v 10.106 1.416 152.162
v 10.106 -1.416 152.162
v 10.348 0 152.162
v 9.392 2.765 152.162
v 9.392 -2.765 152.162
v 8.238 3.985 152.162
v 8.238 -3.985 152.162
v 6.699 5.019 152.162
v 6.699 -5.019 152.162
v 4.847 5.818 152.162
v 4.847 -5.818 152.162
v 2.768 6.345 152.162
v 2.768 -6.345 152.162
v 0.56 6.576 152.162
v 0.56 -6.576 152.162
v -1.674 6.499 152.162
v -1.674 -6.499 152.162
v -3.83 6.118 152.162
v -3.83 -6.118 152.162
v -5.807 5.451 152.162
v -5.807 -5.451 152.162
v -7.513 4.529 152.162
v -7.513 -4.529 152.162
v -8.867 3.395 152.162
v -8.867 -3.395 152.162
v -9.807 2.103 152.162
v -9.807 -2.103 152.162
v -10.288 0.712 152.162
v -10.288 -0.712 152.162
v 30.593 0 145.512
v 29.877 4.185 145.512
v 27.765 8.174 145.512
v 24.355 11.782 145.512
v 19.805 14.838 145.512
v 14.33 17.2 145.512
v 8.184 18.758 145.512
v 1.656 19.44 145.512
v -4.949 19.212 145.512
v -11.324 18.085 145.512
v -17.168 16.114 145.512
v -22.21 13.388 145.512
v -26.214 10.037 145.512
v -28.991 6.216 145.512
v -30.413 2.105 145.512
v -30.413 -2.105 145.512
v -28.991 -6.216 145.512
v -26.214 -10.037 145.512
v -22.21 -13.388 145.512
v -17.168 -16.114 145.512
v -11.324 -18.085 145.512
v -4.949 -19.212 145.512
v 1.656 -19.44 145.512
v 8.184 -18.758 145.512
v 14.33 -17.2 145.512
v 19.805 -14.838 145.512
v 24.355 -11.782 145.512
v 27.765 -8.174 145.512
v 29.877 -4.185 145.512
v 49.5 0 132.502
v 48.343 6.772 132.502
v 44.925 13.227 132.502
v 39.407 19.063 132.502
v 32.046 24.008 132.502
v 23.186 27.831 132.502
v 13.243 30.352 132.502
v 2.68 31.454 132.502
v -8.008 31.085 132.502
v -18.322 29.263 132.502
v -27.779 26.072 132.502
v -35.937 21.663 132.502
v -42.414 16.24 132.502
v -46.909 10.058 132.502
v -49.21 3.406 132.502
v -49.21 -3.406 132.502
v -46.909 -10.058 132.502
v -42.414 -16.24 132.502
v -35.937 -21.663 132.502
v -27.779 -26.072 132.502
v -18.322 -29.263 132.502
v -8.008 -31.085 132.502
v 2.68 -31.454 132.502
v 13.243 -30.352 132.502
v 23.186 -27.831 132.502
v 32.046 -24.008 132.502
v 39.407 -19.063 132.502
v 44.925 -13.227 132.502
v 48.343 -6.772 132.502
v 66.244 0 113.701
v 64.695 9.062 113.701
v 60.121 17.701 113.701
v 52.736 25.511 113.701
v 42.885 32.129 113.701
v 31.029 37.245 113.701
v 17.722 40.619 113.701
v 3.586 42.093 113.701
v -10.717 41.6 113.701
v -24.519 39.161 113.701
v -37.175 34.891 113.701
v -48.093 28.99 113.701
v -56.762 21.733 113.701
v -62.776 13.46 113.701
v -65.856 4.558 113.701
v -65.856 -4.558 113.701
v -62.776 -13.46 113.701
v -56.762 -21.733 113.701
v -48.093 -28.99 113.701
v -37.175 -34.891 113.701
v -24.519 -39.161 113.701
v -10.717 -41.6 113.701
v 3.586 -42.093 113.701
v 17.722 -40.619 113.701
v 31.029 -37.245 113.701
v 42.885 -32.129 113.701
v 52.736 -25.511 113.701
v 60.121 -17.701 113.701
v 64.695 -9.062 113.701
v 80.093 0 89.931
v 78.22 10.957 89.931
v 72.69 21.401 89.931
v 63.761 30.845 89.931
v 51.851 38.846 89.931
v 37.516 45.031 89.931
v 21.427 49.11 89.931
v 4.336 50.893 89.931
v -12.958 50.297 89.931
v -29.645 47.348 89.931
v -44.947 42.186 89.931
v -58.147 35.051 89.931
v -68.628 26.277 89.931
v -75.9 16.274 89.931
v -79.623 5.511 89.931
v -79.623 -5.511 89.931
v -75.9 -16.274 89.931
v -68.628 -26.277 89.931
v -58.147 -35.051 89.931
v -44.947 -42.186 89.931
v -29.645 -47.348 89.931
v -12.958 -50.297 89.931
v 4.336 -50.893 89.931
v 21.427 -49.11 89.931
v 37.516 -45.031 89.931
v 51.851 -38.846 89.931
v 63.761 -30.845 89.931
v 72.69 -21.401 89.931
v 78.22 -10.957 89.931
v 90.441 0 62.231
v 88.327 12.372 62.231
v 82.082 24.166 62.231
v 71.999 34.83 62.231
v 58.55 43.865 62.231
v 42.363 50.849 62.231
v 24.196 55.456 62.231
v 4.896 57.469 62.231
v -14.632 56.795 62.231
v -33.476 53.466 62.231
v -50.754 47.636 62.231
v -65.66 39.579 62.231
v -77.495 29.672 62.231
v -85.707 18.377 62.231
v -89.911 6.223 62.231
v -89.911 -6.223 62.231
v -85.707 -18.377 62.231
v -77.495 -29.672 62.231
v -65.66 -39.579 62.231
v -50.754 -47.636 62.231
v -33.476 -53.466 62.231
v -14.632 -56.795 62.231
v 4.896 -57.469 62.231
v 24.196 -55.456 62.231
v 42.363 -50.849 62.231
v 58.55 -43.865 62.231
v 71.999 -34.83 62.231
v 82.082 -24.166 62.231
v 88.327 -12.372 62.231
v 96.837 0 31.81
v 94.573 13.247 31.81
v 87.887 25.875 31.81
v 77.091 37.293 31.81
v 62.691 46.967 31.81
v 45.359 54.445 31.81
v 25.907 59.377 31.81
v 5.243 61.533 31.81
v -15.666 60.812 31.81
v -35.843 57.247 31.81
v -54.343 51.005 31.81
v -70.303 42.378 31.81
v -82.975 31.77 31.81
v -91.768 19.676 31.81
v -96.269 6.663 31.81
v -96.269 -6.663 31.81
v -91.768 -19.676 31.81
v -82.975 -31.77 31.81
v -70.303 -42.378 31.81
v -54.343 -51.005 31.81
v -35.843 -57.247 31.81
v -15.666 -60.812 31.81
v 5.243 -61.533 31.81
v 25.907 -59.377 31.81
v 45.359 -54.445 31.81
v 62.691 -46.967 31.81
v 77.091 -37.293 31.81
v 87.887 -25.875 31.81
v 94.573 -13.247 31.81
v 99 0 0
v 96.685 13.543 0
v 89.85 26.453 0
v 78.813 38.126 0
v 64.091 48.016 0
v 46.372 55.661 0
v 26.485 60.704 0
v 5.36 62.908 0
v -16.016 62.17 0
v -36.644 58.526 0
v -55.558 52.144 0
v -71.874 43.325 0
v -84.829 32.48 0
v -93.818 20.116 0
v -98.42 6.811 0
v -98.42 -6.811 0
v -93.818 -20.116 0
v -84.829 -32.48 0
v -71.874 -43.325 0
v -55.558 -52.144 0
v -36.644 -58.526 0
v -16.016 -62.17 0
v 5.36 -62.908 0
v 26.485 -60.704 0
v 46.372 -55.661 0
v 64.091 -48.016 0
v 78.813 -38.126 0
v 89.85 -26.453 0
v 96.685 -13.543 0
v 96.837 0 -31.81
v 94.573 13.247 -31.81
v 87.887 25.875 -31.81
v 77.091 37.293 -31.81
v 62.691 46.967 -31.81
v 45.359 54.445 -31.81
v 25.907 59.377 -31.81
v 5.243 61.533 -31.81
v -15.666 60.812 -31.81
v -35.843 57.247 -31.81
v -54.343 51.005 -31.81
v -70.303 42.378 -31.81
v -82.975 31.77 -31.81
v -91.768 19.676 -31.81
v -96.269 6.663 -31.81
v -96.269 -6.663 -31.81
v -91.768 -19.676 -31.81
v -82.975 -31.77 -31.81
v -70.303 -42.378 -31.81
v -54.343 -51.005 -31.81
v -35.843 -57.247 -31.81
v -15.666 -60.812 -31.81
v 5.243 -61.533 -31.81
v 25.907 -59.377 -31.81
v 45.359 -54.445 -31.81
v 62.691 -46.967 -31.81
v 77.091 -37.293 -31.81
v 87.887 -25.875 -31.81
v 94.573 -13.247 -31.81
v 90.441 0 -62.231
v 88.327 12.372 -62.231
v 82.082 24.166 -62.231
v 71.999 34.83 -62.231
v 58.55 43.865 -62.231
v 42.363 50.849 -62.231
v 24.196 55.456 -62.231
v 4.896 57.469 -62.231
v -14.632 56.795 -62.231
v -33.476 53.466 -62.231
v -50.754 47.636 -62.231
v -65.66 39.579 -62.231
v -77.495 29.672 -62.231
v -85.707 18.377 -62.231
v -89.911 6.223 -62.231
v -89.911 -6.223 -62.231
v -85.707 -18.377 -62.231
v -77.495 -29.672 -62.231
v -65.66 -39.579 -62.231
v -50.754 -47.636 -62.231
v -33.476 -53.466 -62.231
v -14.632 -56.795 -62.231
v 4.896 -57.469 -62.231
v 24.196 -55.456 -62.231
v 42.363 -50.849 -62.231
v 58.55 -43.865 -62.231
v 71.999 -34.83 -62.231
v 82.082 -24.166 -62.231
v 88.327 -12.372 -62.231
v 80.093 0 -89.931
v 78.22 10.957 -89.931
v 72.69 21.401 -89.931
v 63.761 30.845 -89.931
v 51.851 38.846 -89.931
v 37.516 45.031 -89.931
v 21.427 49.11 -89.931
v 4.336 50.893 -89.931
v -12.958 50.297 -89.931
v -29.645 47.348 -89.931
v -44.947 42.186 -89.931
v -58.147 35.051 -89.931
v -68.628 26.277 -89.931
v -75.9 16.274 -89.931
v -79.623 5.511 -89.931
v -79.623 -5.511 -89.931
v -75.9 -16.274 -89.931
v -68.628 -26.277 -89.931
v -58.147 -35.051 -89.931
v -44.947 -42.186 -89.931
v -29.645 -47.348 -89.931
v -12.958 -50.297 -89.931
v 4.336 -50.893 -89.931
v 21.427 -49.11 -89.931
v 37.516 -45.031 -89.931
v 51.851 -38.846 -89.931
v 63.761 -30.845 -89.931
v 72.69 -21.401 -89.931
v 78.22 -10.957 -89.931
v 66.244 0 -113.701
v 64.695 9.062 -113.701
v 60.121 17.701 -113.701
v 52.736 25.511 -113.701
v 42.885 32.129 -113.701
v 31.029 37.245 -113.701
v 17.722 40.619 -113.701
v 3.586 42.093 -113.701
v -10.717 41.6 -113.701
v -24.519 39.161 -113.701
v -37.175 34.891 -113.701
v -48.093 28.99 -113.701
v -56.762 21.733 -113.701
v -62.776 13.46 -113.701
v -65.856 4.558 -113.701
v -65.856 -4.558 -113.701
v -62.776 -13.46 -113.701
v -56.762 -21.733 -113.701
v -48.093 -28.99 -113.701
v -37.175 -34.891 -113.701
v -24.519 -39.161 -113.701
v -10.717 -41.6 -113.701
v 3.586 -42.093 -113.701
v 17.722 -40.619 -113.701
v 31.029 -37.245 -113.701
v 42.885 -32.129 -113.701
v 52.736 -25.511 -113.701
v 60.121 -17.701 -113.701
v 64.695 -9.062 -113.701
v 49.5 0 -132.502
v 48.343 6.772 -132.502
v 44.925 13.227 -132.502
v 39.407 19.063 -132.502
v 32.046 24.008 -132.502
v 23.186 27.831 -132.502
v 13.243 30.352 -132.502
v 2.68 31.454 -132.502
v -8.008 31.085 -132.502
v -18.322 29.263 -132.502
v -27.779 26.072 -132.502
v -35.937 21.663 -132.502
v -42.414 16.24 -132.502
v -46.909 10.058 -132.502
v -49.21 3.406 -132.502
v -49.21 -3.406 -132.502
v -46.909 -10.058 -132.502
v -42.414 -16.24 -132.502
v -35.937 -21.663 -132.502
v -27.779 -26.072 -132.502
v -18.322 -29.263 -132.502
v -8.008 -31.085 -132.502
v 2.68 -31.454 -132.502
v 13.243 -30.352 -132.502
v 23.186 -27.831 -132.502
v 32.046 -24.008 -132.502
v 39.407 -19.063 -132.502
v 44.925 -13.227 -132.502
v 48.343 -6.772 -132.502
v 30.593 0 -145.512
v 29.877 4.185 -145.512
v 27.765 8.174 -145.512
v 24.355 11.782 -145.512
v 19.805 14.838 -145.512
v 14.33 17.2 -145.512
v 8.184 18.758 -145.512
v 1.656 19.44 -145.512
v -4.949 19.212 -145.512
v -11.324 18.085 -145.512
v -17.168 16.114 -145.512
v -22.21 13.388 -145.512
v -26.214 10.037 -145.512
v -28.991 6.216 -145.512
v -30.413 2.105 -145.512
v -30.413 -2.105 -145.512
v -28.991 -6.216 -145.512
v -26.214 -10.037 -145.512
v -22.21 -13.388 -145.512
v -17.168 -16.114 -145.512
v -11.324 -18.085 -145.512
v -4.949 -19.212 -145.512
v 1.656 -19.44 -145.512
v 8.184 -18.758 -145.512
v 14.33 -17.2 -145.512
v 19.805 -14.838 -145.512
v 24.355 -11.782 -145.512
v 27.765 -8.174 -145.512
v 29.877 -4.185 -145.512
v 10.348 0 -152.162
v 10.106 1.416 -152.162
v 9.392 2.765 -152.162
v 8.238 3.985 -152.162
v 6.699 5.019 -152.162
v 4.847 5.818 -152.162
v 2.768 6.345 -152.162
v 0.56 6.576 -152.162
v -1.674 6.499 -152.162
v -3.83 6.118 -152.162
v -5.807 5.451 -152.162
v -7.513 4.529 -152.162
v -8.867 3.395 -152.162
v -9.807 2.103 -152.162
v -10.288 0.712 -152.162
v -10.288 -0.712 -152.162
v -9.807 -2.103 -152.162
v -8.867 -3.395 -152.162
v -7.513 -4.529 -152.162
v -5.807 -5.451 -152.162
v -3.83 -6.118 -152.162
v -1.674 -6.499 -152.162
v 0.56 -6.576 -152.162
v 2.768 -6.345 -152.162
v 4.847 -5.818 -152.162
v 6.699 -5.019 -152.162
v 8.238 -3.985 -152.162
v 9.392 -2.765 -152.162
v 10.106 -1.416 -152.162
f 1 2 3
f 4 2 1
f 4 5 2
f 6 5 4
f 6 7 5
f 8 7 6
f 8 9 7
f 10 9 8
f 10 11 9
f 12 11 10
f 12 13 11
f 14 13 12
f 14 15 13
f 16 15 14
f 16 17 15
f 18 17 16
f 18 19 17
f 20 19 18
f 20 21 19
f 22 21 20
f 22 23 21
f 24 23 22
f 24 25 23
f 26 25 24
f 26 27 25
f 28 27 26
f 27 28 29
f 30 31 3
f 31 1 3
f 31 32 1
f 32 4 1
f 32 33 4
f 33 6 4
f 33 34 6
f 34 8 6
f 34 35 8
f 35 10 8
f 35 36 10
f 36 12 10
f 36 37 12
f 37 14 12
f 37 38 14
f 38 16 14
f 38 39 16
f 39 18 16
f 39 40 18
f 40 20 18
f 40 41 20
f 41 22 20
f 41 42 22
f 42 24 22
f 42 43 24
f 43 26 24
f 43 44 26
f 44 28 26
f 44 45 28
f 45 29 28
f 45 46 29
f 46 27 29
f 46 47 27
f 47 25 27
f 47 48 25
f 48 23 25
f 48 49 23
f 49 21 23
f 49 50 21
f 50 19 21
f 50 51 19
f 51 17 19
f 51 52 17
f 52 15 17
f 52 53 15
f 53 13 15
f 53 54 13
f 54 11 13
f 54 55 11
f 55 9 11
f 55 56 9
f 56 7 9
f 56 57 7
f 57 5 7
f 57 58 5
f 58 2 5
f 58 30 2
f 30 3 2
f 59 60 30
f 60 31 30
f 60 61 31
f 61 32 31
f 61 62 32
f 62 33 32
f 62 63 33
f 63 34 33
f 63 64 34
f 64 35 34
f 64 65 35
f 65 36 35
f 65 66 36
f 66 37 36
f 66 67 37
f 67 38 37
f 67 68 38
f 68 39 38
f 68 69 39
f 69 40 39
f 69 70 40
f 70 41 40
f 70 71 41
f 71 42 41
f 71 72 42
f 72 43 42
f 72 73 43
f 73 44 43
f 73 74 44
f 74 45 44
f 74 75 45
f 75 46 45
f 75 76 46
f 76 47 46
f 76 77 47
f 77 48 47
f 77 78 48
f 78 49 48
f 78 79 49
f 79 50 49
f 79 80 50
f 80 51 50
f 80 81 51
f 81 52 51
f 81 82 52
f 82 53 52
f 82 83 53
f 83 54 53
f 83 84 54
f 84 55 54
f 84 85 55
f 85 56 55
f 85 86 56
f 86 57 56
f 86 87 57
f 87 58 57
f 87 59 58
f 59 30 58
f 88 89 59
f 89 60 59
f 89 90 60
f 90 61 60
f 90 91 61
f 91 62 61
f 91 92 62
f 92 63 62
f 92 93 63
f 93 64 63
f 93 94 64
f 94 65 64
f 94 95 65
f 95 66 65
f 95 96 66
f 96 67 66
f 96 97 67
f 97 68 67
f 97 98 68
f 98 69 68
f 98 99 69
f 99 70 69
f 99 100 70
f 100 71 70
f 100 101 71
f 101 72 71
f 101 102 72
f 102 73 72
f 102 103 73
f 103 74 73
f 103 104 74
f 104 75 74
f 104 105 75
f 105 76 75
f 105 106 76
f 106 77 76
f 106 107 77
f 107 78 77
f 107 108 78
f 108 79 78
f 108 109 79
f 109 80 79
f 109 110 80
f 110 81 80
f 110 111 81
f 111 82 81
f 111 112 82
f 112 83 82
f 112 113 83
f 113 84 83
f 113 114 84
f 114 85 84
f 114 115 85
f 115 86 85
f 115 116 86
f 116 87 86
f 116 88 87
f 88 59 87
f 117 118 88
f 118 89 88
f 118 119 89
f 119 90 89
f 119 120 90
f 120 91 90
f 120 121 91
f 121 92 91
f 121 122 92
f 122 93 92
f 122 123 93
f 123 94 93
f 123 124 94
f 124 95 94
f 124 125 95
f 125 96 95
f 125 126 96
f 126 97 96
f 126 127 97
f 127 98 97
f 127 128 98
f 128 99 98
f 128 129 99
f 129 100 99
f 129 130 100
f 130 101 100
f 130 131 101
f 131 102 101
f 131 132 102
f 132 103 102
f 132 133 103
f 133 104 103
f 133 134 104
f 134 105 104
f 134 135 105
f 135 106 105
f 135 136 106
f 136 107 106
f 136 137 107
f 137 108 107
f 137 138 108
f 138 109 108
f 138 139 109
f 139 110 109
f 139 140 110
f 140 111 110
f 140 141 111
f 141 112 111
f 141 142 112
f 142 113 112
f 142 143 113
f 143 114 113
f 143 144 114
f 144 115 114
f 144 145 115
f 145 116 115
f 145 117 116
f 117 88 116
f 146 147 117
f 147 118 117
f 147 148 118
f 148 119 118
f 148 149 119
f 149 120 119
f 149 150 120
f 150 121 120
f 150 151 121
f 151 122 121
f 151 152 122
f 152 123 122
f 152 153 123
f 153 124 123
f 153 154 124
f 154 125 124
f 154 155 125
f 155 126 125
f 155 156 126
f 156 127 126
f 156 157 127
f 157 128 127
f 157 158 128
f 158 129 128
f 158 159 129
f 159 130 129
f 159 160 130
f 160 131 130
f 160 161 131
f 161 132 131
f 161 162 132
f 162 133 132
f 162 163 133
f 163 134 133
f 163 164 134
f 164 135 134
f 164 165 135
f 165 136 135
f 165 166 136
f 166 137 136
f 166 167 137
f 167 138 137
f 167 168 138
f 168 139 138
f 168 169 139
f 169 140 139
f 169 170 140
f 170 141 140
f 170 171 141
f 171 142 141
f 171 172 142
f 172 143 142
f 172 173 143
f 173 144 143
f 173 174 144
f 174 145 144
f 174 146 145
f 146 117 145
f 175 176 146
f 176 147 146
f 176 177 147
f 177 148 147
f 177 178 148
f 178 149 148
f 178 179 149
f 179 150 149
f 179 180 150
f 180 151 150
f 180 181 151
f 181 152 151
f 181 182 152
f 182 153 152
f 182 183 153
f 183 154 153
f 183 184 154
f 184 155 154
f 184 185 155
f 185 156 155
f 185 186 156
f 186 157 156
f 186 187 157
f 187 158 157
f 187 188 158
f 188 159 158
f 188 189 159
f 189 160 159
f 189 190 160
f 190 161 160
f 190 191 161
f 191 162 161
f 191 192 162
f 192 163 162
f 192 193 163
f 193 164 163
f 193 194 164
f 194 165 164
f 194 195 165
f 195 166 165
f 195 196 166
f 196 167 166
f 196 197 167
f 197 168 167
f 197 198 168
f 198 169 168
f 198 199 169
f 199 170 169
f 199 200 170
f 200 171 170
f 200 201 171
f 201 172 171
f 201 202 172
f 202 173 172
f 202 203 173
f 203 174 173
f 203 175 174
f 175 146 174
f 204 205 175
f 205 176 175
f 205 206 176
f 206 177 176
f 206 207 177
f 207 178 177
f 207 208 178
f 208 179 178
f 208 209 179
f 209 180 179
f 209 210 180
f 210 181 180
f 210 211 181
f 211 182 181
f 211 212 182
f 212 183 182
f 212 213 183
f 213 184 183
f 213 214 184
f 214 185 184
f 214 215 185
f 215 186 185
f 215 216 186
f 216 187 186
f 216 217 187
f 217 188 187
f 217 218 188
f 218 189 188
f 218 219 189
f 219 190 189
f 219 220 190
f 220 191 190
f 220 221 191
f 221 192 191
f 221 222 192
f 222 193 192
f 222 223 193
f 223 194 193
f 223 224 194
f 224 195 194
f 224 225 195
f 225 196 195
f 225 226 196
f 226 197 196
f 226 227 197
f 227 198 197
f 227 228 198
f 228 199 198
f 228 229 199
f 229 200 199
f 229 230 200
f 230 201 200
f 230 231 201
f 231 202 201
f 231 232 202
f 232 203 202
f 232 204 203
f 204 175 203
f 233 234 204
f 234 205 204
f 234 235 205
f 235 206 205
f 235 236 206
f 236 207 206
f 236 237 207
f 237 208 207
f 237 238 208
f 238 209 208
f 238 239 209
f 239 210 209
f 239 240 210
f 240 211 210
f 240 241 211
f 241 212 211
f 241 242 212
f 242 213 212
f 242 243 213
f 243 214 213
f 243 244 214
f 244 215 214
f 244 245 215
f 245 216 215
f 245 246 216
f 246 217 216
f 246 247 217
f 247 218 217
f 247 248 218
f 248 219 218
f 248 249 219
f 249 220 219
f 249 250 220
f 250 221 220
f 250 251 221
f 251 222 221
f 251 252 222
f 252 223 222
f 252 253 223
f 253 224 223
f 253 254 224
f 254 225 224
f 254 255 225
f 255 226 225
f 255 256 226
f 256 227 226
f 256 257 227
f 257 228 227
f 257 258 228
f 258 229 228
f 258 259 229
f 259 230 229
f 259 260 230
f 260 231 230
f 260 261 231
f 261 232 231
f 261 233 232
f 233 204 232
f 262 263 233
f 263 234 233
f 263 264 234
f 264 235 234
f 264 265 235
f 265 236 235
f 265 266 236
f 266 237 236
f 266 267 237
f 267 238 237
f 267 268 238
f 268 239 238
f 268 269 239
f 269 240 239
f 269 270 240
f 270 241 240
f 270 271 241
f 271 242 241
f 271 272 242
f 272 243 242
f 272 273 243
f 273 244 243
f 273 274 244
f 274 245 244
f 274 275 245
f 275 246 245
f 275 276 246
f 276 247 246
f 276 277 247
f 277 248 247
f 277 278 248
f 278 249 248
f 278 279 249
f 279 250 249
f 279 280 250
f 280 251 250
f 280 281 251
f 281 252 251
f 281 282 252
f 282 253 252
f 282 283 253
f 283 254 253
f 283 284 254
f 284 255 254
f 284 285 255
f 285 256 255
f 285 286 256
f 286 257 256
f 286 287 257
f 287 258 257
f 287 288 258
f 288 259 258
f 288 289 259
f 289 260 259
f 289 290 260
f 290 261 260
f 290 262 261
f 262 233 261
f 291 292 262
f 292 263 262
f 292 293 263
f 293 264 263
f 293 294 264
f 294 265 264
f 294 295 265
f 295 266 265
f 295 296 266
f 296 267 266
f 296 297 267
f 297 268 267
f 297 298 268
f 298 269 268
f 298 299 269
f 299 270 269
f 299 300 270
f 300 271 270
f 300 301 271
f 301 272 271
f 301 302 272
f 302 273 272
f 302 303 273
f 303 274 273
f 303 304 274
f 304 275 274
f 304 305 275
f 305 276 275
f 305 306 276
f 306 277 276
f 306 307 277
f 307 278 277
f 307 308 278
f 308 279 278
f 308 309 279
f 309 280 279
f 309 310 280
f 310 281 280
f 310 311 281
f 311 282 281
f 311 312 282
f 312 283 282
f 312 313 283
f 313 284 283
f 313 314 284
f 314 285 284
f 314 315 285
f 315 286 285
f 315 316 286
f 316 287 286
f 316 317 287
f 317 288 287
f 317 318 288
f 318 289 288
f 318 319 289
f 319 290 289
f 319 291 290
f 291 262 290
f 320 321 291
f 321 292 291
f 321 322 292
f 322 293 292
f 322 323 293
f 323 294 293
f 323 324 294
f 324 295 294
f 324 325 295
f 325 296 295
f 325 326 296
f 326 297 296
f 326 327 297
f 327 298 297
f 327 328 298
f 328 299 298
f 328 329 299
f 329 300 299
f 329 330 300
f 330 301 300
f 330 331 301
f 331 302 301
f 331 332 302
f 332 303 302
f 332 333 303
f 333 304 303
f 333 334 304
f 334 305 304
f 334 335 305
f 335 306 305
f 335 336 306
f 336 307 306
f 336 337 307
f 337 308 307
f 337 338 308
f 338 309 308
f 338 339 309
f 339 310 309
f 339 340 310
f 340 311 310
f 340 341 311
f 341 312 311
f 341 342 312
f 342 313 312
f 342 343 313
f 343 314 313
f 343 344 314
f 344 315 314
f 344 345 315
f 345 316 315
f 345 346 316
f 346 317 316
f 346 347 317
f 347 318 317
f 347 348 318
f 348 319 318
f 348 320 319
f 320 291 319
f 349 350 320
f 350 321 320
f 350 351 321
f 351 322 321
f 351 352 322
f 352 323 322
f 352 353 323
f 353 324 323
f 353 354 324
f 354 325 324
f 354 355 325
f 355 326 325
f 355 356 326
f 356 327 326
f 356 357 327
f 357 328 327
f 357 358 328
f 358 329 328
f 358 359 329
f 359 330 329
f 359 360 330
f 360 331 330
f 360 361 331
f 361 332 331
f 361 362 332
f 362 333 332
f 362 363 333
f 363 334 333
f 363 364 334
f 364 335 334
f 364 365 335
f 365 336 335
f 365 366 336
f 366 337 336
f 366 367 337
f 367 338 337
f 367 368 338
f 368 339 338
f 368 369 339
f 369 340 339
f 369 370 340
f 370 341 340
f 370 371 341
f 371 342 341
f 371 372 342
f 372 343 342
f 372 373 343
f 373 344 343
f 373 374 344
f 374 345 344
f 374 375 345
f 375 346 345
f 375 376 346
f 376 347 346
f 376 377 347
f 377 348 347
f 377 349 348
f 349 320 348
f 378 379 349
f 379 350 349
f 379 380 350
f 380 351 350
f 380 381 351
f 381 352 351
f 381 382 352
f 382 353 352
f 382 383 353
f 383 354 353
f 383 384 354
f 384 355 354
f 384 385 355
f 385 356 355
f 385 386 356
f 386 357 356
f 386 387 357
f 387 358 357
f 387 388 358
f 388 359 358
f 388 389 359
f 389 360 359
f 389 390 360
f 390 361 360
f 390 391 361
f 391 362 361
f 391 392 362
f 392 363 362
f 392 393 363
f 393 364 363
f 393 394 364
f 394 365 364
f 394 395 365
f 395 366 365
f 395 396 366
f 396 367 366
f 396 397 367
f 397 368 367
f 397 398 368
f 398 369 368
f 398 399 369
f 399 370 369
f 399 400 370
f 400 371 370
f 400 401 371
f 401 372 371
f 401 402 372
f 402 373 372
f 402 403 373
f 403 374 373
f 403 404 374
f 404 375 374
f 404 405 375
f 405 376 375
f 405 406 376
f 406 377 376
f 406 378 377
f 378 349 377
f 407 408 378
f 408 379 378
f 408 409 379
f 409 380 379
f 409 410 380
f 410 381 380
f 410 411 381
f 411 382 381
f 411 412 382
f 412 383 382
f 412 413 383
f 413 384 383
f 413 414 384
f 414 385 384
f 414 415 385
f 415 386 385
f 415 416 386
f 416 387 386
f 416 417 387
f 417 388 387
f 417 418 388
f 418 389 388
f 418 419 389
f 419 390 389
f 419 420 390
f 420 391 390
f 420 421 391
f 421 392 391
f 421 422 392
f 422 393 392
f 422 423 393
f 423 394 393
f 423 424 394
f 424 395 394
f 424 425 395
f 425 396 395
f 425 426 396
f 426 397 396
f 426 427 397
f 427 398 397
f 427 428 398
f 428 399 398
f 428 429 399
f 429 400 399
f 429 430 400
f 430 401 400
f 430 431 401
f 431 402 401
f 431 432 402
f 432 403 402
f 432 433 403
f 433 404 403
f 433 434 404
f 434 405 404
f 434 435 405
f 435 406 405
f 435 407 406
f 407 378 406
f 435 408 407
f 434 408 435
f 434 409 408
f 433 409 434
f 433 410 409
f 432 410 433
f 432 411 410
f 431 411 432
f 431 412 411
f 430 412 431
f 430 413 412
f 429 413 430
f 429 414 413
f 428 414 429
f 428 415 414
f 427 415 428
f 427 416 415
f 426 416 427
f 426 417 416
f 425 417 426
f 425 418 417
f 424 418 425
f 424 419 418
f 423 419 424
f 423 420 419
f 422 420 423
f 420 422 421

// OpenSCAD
// Generated by SolidPython 1.0.1 on 2020-07-29 00:46:49


scale(v = [11, 7, 17]) {
	sphere(r = 9);
}
/***********************************************
*********      SolidPython code:      **********
************************************************
 
# import packages: SolidPython
from solid import *
from solid.utils import *
from itertools import chain, combinations, permutations


class Resize:

    def __init__(self, scad_file):
        self.scad_file = scad_file
        #self.scad_file = import_scad(scad_file)
        # cone/cylinder param:
        self.r1 = 0
        self.r2 = 0
        self.h = 0
        # rectangular prism param:
        self.w = 0
        self.l = 0
        # ellipse param:
        self.r = 0

    # import OpenScad code (file name corresponds to shape)


    # classify shape + parameters
    def assign(self, param1, param2, param3):
        if self.scad_file == 'cone.scad':
            self.r1 = param1
            self.r2 = param2
            self.h = param3
        elif self.scad_file == 'cylinder.scad':
            self.r1 = param1
            self.r2 = param2
            self.h = param3
        elif self.scad_file == 'rectangularPrism.scad':
            self.h = param1
            self.l = param2
            self.w = param3
        else:
            self.r = param1
            self.h = param2

    # resize parameters
    def iterate(self):
        x = range(3, 20, 2)
        i = 1
        if self.scad_file == 'cone.scad':
            tempList = list(permutations(x, 2))
            for temp in tempList:
                param1 = temp[0]
                param2 = temp[1]
                filepath = 'produced_scad_files/' + 'cone' + str(param1) + '_' + str(param2) + '_' + '.scad'
                scad_render_to_file(cylinder(h=param1, r1=param2, r2=0), filepath)

        elif self.scad_file == 'cylinder.scad':
            tempList = list(permutations(x, 3))
            for temp in tempList:
                param1 = temp[0]
                param2 = temp[1]
                filepath = 'produced_scad_files/' + 'cylinder' + str(param1) + '_' + str(param2) + '_' + '.scad'
                scad_render_to_file(cylinder(h=param1, r1=param2, r2=param2), filepath)

        elif self.scad_file == 'rectangularPrism.scad':
            tempList = list(permutations(x, 3))
            for temp in tempList:
                param1 = temp[0]
                param2 = temp[1]
                param3 = temp[2]
                filepath = 'produced_scad_files/' + 'rectangularPrism' + str(param1) + '_' + str(param2) + '_' + str(
                    param3) + '.scad'
                scad_render_to_file(cube(size=(param1, param2, param3)), filepath)

        elif self.scad_file == 'ellipse.scad':
            tempList = list(permutations(x, 4))
            for temp in tempList:
                param1 = temp[0]
                param2 = temp[1]
                param3 = temp[2]
                param4 = temp[3]
                filepath = 'produced_scad_files/' + 'ellipse' + str(param1) + '_' + str(param2) + '_' + str(param3) + '_' + str(param4) + '.scad'
                scad_render_to_file(scale([param1, param2, param3])(sphere(r=param4)), filepath)

    def render_to_scadfile(self):
        scad_render_to_file(scad, 'example.scad') 
 
************************************************/
